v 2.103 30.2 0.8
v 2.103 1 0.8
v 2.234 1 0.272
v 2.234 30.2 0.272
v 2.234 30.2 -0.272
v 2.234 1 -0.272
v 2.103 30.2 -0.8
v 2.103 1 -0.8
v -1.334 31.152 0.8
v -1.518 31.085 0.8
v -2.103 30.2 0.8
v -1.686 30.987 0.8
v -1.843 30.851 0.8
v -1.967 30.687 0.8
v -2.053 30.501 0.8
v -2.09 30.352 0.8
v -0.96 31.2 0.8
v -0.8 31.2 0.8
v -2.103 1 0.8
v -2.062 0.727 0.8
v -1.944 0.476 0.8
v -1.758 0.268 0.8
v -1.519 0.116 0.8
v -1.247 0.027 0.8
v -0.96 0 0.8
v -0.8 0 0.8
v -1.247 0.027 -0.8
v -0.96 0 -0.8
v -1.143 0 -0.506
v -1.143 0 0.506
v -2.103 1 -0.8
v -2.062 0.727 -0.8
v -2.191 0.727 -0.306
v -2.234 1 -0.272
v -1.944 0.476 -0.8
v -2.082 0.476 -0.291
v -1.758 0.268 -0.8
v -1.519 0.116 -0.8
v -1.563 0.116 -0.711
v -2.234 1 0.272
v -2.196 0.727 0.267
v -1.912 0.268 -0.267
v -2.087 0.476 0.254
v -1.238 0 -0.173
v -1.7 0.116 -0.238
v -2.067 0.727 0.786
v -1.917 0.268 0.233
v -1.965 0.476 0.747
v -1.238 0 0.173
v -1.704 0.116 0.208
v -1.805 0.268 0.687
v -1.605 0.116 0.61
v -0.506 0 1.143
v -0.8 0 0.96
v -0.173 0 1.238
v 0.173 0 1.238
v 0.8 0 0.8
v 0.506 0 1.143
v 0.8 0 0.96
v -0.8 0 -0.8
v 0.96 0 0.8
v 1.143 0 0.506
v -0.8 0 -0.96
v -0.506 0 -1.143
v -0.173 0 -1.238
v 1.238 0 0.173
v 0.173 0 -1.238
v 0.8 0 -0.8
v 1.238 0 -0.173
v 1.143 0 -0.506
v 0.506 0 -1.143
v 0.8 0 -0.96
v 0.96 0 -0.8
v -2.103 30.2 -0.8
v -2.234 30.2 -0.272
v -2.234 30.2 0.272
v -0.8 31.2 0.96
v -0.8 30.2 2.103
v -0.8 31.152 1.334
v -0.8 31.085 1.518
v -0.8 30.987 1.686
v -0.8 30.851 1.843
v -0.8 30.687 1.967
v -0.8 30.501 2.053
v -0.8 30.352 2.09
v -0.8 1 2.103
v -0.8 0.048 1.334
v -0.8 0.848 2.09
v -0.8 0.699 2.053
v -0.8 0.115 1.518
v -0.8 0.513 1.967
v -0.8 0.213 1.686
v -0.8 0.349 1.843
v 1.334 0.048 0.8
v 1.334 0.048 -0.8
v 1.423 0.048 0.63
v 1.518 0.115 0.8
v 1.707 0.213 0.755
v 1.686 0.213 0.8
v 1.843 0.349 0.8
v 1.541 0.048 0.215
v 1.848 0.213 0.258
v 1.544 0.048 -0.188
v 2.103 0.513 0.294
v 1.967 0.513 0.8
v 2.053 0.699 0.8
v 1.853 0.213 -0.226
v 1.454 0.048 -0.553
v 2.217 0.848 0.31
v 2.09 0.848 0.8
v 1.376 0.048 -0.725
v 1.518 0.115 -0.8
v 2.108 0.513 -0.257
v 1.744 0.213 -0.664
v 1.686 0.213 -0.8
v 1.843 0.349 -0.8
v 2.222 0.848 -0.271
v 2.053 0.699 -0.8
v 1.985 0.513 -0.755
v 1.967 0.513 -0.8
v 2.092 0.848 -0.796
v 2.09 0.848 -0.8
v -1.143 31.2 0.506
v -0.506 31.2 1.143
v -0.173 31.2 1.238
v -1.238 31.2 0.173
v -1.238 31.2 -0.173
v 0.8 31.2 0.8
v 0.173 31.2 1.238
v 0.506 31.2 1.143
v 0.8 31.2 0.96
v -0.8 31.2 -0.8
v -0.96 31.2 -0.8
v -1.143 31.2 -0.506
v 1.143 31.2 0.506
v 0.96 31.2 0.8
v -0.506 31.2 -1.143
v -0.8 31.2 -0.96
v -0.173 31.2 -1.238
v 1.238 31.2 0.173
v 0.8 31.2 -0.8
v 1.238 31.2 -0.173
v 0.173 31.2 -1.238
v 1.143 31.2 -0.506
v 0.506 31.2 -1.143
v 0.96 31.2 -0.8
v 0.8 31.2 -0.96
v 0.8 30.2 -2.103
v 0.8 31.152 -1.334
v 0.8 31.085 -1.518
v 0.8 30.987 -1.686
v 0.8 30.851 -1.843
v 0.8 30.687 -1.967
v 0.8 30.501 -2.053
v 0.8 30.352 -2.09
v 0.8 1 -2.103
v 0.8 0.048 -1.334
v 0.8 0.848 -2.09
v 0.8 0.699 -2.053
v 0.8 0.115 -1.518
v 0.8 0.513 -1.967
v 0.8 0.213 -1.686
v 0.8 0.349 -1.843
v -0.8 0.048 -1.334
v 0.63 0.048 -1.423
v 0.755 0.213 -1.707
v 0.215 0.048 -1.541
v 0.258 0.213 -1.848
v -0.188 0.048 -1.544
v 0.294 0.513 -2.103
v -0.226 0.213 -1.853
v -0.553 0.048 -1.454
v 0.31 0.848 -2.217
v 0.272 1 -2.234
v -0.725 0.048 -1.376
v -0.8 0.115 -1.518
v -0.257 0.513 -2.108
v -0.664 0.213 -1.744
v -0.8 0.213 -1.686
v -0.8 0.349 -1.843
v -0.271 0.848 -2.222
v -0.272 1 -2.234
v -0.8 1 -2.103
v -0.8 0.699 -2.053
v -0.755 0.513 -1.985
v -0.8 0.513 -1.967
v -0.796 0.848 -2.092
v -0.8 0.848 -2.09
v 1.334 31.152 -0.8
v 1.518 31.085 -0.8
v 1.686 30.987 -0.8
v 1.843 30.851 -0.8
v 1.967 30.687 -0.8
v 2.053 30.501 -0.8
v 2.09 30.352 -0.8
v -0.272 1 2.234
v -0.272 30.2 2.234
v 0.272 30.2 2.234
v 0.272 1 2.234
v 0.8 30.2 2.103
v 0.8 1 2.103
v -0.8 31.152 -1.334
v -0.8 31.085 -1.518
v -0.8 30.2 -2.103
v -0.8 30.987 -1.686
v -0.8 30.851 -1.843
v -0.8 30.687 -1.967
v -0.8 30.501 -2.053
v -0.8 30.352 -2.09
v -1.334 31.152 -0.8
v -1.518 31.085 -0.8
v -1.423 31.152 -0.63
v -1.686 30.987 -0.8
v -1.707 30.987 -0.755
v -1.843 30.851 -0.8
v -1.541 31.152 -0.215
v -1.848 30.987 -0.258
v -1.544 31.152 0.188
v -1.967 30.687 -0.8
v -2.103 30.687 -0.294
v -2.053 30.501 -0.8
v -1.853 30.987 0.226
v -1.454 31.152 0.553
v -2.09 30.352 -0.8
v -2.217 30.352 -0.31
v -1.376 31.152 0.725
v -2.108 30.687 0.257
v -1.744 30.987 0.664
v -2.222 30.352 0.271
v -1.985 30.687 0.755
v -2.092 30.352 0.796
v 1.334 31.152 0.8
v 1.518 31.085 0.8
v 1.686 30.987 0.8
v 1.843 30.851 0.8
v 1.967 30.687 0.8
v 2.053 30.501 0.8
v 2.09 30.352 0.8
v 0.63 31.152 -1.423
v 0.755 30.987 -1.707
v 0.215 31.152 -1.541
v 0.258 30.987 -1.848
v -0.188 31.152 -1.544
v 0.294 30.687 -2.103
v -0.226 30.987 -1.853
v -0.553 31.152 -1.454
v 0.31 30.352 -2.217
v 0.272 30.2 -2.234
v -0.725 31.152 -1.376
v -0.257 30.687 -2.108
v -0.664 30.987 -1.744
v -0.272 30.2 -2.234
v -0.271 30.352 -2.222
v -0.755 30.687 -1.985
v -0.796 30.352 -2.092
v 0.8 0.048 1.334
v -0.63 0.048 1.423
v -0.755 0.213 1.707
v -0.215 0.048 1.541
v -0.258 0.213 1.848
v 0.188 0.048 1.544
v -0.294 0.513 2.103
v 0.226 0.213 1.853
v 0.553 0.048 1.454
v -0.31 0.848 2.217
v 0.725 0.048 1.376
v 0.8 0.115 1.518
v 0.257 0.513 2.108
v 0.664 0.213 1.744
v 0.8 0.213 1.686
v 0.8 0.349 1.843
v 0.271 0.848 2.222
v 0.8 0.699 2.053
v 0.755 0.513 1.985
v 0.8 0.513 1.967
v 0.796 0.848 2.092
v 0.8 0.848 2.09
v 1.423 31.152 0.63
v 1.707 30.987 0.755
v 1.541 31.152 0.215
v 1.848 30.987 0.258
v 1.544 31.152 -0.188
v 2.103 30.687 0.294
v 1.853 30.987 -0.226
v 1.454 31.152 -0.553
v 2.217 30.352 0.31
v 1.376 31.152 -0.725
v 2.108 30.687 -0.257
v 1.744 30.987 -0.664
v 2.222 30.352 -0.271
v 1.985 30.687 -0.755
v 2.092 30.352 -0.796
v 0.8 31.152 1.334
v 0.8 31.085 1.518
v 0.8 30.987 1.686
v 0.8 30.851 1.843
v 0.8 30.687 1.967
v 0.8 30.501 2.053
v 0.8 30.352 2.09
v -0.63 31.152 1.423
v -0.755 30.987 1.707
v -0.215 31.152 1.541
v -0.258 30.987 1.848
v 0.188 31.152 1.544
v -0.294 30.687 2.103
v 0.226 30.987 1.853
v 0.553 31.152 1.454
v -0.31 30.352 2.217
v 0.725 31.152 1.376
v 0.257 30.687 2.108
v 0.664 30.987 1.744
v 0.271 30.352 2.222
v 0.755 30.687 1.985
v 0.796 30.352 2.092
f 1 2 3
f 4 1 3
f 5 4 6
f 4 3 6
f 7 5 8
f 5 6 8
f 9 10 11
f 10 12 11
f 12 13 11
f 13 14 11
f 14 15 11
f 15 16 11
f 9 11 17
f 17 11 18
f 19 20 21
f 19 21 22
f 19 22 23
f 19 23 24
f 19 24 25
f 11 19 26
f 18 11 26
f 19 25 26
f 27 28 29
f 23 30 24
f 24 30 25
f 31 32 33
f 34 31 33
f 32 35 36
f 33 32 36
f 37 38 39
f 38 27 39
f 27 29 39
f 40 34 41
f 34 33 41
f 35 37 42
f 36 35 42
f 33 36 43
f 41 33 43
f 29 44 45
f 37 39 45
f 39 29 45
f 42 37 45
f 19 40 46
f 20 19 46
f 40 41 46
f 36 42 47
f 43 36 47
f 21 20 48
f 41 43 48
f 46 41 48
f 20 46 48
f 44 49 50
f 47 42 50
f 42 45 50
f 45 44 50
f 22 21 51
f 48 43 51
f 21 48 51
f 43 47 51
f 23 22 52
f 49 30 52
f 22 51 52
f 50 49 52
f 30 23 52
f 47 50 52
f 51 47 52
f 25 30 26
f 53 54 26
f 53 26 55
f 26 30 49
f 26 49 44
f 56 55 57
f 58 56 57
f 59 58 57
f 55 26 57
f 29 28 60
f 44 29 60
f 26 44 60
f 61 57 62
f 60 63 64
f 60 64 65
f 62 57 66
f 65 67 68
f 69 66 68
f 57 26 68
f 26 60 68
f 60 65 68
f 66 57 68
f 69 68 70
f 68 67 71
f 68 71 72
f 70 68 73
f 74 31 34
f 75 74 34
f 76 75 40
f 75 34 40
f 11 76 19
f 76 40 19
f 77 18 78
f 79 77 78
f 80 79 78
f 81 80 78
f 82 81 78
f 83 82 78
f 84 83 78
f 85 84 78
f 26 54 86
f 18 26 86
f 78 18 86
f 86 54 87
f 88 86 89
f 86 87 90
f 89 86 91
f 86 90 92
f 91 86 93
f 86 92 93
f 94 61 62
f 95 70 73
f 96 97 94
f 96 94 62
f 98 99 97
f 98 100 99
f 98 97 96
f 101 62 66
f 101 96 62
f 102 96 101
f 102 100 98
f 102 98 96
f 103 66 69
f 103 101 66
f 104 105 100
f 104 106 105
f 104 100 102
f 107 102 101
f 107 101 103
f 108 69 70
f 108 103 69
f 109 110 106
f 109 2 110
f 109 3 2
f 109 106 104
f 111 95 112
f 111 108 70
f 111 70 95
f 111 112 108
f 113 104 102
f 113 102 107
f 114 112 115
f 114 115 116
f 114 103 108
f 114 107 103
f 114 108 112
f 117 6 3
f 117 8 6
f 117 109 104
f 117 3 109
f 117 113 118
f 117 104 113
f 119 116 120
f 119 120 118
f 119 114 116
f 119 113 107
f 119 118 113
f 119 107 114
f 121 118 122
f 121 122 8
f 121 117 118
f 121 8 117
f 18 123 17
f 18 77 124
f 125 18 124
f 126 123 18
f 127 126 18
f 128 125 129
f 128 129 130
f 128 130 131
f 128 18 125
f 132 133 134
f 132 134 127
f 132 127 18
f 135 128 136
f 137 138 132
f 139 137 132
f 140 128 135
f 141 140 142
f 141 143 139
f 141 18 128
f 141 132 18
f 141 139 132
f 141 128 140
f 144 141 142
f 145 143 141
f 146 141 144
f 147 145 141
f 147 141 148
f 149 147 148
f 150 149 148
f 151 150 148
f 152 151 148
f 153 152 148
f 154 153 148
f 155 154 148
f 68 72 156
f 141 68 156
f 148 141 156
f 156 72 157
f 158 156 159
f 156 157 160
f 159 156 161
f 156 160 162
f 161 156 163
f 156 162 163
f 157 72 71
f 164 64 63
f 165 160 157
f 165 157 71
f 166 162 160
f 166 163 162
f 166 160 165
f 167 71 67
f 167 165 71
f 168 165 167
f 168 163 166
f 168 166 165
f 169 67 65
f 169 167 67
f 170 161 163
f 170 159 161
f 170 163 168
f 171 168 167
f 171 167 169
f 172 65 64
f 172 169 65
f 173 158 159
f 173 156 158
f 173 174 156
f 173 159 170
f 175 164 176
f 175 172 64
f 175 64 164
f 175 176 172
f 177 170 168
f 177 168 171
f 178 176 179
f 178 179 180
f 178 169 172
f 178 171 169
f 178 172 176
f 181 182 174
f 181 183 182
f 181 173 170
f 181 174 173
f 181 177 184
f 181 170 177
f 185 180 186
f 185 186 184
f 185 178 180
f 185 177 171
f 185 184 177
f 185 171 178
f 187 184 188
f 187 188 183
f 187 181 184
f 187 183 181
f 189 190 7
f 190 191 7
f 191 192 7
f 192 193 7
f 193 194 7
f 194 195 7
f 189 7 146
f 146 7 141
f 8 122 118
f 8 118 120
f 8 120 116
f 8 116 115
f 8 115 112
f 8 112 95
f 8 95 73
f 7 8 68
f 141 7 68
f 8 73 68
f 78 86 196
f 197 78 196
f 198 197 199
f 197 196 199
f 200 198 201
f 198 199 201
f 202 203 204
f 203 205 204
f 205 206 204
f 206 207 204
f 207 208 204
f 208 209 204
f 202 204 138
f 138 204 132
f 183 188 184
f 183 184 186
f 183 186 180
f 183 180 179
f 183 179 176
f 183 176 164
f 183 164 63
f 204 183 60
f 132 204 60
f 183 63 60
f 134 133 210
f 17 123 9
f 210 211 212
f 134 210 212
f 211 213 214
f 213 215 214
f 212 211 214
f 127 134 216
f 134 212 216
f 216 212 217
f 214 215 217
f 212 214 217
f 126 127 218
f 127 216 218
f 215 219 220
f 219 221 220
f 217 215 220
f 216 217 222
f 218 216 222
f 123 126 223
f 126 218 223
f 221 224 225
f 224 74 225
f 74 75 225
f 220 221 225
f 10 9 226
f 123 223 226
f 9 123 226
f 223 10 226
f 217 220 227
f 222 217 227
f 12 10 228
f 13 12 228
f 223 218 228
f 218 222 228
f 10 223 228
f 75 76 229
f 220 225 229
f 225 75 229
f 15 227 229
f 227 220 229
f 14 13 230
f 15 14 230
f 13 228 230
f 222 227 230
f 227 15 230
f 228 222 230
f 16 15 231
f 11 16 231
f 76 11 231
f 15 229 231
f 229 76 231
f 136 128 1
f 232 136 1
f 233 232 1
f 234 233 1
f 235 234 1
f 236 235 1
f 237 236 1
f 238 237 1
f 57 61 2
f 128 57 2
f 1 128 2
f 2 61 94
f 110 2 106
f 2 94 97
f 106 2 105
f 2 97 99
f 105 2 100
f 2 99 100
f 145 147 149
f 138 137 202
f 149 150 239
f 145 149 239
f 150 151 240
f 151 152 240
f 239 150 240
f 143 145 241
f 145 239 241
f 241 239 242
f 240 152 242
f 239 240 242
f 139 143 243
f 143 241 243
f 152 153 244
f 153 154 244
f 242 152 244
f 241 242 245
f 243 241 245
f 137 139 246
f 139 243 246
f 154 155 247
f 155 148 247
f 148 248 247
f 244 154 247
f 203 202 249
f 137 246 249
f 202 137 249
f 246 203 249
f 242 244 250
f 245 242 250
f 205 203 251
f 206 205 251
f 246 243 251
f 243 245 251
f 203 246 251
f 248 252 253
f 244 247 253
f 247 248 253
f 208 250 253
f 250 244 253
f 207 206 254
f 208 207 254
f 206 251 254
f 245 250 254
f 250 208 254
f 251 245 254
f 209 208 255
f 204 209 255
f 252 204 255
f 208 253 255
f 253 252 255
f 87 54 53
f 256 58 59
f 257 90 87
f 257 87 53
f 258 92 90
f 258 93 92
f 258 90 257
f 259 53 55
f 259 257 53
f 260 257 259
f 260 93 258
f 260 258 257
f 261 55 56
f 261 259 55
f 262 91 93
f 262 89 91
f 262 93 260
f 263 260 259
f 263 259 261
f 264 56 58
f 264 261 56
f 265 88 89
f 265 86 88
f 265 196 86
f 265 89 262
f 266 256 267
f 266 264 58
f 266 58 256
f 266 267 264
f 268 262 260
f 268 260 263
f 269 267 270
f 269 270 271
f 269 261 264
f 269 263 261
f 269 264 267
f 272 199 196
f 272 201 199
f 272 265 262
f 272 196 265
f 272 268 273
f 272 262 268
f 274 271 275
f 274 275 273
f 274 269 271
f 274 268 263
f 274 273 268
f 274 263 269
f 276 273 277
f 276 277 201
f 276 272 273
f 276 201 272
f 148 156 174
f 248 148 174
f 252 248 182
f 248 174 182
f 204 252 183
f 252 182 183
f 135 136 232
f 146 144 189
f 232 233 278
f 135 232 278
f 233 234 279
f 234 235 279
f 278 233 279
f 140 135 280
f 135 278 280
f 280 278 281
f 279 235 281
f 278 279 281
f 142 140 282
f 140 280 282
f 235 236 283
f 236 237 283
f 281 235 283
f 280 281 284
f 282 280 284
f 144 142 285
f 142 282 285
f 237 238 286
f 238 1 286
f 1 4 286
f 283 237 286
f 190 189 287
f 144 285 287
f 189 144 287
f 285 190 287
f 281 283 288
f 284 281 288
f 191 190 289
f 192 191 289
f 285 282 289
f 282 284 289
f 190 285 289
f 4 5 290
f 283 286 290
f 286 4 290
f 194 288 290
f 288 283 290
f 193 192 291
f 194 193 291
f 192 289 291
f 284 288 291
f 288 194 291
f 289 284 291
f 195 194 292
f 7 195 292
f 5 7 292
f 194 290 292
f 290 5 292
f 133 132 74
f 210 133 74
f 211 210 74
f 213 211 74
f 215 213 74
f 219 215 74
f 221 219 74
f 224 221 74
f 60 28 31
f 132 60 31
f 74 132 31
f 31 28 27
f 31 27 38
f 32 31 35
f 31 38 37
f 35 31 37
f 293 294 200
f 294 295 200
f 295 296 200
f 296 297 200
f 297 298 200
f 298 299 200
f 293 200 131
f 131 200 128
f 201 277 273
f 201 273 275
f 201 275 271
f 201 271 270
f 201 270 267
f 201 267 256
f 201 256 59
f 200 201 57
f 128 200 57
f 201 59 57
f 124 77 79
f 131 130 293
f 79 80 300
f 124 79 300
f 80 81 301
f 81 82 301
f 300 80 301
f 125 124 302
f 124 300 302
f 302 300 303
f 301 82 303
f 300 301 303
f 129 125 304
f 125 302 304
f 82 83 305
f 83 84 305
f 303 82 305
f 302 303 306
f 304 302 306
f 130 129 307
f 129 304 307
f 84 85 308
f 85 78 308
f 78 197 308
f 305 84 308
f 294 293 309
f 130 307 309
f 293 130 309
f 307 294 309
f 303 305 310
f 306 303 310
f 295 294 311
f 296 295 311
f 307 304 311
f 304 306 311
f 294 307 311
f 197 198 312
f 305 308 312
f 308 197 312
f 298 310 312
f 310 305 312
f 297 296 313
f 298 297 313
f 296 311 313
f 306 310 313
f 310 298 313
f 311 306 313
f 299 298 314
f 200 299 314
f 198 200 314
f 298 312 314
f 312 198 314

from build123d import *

# Parameters (mm, degrees)
BOSS_EXTRUDE1_DEPTH = 31.2
FILLET1_R           = 1
FILLET2_R           = 1
FILLET3_R           = 1
FILLET4_R           = 1
FILLET20_R          = 1
FILLET21_R          = 1
FILLET22_R          = 1
FILLET23_R          = 1


with BuildPart() as part:
    # Sketch1 → Boss-Extrude1 (new body)
    with BuildSketch(Plane(origin=(0, 0, 0), x_dir=(1, 0, 0), z_dir=(0, 1, 0))):
        with BuildLine():
            Line((-0.8, -0.8), (-0.8, -2.102974084))
            ThreePointArc((-0.8, -2.102974084), (0, -2.25), (0.8, -2.102974084))
            Line((0.8, -2.102974084), (0.8, -0.8))
            Line((0.8, -0.8), (2.102974084, -0.8))
            ThreePointArc((2.102974084, -0.8), (2.25, 0), (2.102974084, 0.8))
            Line((2.102974084, 0.8), (0.8, 0.8))
            Line((0.8, 0.8), (0.8, 2.102974084))
            ThreePointArc((0.8, 2.102974084), (0, 2.25), (-0.8, 2.102974084))
            Line((-0.8, 2.102974084), (-0.8, 0.8))
            Line((-0.8, 0.8), (-2.102974084, 0.8))
            ThreePointArc((-2.102974084, 0.8), (-2.25, 0), (-2.102974084, -0.8))
            Line((-2.102974084, -0.8), (-0.8, -0.8))
        make_face()
    extrude(amount=BOSS_EXTRUDE1_DEPTH)

    # Fillet1
    fillet1_edges = [part.edges().sort_by_distance(p)[0] for p in [
        (-2.25, 0, 0),
    ]]
    fillet(fillet1_edges, radius=FILLET1_R)

    # Fillet2
    fillet2_edges = [part.edges().sort_by_distance(p)[0] for p in [
        (0, 0, 2.25),
    ]]
    fillet(fillet2_edges, radius=FILLET2_R)

    # Fillet3
    fillet3_edges = [part.edges().sort_by_distance(p)[0] for p in [
        (2.25, 0, 0),
    ]]
    fillet(fillet3_edges, radius=FILLET3_R)

    # Fillet4
    fillet4_edges = [part.edges().sort_by_distance(p)[0] for p in [
        (0, 0, -2.25),
    ]]
    fillet(fillet4_edges, radius=FILLET4_R)

    # Fillet20
    fillet20_edges = [part.edges().sort_by_distance(p)[0] for p in [
        (2.25, 31.2, 0),
    ]]
    fillet(fillet20_edges, radius=FILLET20_R)

    # Fillet21
    fillet21_edges = [part.edges().sort_by_distance(p)[0] for p in [
        (0, 31.2, 2.25),
    ]]
    fillet(fillet21_edges, radius=FILLET21_R)

    # Fillet22
    fillet22_edges = [part.edges().sort_by_distance(p)[0] for p in [
        (-2.25, 31.2, 0),
    ]]
    fillet(fillet22_edges, radius=FILLET22_R)

    # Fillet23
    fillet23_edges = [part.edges().sort_by_distance(p)[0] for p in [
        (0, 31.2, -2.25),
    ]]
    fillet(fillet23_edges, radius=FILLET23_R)


solid = part.part
